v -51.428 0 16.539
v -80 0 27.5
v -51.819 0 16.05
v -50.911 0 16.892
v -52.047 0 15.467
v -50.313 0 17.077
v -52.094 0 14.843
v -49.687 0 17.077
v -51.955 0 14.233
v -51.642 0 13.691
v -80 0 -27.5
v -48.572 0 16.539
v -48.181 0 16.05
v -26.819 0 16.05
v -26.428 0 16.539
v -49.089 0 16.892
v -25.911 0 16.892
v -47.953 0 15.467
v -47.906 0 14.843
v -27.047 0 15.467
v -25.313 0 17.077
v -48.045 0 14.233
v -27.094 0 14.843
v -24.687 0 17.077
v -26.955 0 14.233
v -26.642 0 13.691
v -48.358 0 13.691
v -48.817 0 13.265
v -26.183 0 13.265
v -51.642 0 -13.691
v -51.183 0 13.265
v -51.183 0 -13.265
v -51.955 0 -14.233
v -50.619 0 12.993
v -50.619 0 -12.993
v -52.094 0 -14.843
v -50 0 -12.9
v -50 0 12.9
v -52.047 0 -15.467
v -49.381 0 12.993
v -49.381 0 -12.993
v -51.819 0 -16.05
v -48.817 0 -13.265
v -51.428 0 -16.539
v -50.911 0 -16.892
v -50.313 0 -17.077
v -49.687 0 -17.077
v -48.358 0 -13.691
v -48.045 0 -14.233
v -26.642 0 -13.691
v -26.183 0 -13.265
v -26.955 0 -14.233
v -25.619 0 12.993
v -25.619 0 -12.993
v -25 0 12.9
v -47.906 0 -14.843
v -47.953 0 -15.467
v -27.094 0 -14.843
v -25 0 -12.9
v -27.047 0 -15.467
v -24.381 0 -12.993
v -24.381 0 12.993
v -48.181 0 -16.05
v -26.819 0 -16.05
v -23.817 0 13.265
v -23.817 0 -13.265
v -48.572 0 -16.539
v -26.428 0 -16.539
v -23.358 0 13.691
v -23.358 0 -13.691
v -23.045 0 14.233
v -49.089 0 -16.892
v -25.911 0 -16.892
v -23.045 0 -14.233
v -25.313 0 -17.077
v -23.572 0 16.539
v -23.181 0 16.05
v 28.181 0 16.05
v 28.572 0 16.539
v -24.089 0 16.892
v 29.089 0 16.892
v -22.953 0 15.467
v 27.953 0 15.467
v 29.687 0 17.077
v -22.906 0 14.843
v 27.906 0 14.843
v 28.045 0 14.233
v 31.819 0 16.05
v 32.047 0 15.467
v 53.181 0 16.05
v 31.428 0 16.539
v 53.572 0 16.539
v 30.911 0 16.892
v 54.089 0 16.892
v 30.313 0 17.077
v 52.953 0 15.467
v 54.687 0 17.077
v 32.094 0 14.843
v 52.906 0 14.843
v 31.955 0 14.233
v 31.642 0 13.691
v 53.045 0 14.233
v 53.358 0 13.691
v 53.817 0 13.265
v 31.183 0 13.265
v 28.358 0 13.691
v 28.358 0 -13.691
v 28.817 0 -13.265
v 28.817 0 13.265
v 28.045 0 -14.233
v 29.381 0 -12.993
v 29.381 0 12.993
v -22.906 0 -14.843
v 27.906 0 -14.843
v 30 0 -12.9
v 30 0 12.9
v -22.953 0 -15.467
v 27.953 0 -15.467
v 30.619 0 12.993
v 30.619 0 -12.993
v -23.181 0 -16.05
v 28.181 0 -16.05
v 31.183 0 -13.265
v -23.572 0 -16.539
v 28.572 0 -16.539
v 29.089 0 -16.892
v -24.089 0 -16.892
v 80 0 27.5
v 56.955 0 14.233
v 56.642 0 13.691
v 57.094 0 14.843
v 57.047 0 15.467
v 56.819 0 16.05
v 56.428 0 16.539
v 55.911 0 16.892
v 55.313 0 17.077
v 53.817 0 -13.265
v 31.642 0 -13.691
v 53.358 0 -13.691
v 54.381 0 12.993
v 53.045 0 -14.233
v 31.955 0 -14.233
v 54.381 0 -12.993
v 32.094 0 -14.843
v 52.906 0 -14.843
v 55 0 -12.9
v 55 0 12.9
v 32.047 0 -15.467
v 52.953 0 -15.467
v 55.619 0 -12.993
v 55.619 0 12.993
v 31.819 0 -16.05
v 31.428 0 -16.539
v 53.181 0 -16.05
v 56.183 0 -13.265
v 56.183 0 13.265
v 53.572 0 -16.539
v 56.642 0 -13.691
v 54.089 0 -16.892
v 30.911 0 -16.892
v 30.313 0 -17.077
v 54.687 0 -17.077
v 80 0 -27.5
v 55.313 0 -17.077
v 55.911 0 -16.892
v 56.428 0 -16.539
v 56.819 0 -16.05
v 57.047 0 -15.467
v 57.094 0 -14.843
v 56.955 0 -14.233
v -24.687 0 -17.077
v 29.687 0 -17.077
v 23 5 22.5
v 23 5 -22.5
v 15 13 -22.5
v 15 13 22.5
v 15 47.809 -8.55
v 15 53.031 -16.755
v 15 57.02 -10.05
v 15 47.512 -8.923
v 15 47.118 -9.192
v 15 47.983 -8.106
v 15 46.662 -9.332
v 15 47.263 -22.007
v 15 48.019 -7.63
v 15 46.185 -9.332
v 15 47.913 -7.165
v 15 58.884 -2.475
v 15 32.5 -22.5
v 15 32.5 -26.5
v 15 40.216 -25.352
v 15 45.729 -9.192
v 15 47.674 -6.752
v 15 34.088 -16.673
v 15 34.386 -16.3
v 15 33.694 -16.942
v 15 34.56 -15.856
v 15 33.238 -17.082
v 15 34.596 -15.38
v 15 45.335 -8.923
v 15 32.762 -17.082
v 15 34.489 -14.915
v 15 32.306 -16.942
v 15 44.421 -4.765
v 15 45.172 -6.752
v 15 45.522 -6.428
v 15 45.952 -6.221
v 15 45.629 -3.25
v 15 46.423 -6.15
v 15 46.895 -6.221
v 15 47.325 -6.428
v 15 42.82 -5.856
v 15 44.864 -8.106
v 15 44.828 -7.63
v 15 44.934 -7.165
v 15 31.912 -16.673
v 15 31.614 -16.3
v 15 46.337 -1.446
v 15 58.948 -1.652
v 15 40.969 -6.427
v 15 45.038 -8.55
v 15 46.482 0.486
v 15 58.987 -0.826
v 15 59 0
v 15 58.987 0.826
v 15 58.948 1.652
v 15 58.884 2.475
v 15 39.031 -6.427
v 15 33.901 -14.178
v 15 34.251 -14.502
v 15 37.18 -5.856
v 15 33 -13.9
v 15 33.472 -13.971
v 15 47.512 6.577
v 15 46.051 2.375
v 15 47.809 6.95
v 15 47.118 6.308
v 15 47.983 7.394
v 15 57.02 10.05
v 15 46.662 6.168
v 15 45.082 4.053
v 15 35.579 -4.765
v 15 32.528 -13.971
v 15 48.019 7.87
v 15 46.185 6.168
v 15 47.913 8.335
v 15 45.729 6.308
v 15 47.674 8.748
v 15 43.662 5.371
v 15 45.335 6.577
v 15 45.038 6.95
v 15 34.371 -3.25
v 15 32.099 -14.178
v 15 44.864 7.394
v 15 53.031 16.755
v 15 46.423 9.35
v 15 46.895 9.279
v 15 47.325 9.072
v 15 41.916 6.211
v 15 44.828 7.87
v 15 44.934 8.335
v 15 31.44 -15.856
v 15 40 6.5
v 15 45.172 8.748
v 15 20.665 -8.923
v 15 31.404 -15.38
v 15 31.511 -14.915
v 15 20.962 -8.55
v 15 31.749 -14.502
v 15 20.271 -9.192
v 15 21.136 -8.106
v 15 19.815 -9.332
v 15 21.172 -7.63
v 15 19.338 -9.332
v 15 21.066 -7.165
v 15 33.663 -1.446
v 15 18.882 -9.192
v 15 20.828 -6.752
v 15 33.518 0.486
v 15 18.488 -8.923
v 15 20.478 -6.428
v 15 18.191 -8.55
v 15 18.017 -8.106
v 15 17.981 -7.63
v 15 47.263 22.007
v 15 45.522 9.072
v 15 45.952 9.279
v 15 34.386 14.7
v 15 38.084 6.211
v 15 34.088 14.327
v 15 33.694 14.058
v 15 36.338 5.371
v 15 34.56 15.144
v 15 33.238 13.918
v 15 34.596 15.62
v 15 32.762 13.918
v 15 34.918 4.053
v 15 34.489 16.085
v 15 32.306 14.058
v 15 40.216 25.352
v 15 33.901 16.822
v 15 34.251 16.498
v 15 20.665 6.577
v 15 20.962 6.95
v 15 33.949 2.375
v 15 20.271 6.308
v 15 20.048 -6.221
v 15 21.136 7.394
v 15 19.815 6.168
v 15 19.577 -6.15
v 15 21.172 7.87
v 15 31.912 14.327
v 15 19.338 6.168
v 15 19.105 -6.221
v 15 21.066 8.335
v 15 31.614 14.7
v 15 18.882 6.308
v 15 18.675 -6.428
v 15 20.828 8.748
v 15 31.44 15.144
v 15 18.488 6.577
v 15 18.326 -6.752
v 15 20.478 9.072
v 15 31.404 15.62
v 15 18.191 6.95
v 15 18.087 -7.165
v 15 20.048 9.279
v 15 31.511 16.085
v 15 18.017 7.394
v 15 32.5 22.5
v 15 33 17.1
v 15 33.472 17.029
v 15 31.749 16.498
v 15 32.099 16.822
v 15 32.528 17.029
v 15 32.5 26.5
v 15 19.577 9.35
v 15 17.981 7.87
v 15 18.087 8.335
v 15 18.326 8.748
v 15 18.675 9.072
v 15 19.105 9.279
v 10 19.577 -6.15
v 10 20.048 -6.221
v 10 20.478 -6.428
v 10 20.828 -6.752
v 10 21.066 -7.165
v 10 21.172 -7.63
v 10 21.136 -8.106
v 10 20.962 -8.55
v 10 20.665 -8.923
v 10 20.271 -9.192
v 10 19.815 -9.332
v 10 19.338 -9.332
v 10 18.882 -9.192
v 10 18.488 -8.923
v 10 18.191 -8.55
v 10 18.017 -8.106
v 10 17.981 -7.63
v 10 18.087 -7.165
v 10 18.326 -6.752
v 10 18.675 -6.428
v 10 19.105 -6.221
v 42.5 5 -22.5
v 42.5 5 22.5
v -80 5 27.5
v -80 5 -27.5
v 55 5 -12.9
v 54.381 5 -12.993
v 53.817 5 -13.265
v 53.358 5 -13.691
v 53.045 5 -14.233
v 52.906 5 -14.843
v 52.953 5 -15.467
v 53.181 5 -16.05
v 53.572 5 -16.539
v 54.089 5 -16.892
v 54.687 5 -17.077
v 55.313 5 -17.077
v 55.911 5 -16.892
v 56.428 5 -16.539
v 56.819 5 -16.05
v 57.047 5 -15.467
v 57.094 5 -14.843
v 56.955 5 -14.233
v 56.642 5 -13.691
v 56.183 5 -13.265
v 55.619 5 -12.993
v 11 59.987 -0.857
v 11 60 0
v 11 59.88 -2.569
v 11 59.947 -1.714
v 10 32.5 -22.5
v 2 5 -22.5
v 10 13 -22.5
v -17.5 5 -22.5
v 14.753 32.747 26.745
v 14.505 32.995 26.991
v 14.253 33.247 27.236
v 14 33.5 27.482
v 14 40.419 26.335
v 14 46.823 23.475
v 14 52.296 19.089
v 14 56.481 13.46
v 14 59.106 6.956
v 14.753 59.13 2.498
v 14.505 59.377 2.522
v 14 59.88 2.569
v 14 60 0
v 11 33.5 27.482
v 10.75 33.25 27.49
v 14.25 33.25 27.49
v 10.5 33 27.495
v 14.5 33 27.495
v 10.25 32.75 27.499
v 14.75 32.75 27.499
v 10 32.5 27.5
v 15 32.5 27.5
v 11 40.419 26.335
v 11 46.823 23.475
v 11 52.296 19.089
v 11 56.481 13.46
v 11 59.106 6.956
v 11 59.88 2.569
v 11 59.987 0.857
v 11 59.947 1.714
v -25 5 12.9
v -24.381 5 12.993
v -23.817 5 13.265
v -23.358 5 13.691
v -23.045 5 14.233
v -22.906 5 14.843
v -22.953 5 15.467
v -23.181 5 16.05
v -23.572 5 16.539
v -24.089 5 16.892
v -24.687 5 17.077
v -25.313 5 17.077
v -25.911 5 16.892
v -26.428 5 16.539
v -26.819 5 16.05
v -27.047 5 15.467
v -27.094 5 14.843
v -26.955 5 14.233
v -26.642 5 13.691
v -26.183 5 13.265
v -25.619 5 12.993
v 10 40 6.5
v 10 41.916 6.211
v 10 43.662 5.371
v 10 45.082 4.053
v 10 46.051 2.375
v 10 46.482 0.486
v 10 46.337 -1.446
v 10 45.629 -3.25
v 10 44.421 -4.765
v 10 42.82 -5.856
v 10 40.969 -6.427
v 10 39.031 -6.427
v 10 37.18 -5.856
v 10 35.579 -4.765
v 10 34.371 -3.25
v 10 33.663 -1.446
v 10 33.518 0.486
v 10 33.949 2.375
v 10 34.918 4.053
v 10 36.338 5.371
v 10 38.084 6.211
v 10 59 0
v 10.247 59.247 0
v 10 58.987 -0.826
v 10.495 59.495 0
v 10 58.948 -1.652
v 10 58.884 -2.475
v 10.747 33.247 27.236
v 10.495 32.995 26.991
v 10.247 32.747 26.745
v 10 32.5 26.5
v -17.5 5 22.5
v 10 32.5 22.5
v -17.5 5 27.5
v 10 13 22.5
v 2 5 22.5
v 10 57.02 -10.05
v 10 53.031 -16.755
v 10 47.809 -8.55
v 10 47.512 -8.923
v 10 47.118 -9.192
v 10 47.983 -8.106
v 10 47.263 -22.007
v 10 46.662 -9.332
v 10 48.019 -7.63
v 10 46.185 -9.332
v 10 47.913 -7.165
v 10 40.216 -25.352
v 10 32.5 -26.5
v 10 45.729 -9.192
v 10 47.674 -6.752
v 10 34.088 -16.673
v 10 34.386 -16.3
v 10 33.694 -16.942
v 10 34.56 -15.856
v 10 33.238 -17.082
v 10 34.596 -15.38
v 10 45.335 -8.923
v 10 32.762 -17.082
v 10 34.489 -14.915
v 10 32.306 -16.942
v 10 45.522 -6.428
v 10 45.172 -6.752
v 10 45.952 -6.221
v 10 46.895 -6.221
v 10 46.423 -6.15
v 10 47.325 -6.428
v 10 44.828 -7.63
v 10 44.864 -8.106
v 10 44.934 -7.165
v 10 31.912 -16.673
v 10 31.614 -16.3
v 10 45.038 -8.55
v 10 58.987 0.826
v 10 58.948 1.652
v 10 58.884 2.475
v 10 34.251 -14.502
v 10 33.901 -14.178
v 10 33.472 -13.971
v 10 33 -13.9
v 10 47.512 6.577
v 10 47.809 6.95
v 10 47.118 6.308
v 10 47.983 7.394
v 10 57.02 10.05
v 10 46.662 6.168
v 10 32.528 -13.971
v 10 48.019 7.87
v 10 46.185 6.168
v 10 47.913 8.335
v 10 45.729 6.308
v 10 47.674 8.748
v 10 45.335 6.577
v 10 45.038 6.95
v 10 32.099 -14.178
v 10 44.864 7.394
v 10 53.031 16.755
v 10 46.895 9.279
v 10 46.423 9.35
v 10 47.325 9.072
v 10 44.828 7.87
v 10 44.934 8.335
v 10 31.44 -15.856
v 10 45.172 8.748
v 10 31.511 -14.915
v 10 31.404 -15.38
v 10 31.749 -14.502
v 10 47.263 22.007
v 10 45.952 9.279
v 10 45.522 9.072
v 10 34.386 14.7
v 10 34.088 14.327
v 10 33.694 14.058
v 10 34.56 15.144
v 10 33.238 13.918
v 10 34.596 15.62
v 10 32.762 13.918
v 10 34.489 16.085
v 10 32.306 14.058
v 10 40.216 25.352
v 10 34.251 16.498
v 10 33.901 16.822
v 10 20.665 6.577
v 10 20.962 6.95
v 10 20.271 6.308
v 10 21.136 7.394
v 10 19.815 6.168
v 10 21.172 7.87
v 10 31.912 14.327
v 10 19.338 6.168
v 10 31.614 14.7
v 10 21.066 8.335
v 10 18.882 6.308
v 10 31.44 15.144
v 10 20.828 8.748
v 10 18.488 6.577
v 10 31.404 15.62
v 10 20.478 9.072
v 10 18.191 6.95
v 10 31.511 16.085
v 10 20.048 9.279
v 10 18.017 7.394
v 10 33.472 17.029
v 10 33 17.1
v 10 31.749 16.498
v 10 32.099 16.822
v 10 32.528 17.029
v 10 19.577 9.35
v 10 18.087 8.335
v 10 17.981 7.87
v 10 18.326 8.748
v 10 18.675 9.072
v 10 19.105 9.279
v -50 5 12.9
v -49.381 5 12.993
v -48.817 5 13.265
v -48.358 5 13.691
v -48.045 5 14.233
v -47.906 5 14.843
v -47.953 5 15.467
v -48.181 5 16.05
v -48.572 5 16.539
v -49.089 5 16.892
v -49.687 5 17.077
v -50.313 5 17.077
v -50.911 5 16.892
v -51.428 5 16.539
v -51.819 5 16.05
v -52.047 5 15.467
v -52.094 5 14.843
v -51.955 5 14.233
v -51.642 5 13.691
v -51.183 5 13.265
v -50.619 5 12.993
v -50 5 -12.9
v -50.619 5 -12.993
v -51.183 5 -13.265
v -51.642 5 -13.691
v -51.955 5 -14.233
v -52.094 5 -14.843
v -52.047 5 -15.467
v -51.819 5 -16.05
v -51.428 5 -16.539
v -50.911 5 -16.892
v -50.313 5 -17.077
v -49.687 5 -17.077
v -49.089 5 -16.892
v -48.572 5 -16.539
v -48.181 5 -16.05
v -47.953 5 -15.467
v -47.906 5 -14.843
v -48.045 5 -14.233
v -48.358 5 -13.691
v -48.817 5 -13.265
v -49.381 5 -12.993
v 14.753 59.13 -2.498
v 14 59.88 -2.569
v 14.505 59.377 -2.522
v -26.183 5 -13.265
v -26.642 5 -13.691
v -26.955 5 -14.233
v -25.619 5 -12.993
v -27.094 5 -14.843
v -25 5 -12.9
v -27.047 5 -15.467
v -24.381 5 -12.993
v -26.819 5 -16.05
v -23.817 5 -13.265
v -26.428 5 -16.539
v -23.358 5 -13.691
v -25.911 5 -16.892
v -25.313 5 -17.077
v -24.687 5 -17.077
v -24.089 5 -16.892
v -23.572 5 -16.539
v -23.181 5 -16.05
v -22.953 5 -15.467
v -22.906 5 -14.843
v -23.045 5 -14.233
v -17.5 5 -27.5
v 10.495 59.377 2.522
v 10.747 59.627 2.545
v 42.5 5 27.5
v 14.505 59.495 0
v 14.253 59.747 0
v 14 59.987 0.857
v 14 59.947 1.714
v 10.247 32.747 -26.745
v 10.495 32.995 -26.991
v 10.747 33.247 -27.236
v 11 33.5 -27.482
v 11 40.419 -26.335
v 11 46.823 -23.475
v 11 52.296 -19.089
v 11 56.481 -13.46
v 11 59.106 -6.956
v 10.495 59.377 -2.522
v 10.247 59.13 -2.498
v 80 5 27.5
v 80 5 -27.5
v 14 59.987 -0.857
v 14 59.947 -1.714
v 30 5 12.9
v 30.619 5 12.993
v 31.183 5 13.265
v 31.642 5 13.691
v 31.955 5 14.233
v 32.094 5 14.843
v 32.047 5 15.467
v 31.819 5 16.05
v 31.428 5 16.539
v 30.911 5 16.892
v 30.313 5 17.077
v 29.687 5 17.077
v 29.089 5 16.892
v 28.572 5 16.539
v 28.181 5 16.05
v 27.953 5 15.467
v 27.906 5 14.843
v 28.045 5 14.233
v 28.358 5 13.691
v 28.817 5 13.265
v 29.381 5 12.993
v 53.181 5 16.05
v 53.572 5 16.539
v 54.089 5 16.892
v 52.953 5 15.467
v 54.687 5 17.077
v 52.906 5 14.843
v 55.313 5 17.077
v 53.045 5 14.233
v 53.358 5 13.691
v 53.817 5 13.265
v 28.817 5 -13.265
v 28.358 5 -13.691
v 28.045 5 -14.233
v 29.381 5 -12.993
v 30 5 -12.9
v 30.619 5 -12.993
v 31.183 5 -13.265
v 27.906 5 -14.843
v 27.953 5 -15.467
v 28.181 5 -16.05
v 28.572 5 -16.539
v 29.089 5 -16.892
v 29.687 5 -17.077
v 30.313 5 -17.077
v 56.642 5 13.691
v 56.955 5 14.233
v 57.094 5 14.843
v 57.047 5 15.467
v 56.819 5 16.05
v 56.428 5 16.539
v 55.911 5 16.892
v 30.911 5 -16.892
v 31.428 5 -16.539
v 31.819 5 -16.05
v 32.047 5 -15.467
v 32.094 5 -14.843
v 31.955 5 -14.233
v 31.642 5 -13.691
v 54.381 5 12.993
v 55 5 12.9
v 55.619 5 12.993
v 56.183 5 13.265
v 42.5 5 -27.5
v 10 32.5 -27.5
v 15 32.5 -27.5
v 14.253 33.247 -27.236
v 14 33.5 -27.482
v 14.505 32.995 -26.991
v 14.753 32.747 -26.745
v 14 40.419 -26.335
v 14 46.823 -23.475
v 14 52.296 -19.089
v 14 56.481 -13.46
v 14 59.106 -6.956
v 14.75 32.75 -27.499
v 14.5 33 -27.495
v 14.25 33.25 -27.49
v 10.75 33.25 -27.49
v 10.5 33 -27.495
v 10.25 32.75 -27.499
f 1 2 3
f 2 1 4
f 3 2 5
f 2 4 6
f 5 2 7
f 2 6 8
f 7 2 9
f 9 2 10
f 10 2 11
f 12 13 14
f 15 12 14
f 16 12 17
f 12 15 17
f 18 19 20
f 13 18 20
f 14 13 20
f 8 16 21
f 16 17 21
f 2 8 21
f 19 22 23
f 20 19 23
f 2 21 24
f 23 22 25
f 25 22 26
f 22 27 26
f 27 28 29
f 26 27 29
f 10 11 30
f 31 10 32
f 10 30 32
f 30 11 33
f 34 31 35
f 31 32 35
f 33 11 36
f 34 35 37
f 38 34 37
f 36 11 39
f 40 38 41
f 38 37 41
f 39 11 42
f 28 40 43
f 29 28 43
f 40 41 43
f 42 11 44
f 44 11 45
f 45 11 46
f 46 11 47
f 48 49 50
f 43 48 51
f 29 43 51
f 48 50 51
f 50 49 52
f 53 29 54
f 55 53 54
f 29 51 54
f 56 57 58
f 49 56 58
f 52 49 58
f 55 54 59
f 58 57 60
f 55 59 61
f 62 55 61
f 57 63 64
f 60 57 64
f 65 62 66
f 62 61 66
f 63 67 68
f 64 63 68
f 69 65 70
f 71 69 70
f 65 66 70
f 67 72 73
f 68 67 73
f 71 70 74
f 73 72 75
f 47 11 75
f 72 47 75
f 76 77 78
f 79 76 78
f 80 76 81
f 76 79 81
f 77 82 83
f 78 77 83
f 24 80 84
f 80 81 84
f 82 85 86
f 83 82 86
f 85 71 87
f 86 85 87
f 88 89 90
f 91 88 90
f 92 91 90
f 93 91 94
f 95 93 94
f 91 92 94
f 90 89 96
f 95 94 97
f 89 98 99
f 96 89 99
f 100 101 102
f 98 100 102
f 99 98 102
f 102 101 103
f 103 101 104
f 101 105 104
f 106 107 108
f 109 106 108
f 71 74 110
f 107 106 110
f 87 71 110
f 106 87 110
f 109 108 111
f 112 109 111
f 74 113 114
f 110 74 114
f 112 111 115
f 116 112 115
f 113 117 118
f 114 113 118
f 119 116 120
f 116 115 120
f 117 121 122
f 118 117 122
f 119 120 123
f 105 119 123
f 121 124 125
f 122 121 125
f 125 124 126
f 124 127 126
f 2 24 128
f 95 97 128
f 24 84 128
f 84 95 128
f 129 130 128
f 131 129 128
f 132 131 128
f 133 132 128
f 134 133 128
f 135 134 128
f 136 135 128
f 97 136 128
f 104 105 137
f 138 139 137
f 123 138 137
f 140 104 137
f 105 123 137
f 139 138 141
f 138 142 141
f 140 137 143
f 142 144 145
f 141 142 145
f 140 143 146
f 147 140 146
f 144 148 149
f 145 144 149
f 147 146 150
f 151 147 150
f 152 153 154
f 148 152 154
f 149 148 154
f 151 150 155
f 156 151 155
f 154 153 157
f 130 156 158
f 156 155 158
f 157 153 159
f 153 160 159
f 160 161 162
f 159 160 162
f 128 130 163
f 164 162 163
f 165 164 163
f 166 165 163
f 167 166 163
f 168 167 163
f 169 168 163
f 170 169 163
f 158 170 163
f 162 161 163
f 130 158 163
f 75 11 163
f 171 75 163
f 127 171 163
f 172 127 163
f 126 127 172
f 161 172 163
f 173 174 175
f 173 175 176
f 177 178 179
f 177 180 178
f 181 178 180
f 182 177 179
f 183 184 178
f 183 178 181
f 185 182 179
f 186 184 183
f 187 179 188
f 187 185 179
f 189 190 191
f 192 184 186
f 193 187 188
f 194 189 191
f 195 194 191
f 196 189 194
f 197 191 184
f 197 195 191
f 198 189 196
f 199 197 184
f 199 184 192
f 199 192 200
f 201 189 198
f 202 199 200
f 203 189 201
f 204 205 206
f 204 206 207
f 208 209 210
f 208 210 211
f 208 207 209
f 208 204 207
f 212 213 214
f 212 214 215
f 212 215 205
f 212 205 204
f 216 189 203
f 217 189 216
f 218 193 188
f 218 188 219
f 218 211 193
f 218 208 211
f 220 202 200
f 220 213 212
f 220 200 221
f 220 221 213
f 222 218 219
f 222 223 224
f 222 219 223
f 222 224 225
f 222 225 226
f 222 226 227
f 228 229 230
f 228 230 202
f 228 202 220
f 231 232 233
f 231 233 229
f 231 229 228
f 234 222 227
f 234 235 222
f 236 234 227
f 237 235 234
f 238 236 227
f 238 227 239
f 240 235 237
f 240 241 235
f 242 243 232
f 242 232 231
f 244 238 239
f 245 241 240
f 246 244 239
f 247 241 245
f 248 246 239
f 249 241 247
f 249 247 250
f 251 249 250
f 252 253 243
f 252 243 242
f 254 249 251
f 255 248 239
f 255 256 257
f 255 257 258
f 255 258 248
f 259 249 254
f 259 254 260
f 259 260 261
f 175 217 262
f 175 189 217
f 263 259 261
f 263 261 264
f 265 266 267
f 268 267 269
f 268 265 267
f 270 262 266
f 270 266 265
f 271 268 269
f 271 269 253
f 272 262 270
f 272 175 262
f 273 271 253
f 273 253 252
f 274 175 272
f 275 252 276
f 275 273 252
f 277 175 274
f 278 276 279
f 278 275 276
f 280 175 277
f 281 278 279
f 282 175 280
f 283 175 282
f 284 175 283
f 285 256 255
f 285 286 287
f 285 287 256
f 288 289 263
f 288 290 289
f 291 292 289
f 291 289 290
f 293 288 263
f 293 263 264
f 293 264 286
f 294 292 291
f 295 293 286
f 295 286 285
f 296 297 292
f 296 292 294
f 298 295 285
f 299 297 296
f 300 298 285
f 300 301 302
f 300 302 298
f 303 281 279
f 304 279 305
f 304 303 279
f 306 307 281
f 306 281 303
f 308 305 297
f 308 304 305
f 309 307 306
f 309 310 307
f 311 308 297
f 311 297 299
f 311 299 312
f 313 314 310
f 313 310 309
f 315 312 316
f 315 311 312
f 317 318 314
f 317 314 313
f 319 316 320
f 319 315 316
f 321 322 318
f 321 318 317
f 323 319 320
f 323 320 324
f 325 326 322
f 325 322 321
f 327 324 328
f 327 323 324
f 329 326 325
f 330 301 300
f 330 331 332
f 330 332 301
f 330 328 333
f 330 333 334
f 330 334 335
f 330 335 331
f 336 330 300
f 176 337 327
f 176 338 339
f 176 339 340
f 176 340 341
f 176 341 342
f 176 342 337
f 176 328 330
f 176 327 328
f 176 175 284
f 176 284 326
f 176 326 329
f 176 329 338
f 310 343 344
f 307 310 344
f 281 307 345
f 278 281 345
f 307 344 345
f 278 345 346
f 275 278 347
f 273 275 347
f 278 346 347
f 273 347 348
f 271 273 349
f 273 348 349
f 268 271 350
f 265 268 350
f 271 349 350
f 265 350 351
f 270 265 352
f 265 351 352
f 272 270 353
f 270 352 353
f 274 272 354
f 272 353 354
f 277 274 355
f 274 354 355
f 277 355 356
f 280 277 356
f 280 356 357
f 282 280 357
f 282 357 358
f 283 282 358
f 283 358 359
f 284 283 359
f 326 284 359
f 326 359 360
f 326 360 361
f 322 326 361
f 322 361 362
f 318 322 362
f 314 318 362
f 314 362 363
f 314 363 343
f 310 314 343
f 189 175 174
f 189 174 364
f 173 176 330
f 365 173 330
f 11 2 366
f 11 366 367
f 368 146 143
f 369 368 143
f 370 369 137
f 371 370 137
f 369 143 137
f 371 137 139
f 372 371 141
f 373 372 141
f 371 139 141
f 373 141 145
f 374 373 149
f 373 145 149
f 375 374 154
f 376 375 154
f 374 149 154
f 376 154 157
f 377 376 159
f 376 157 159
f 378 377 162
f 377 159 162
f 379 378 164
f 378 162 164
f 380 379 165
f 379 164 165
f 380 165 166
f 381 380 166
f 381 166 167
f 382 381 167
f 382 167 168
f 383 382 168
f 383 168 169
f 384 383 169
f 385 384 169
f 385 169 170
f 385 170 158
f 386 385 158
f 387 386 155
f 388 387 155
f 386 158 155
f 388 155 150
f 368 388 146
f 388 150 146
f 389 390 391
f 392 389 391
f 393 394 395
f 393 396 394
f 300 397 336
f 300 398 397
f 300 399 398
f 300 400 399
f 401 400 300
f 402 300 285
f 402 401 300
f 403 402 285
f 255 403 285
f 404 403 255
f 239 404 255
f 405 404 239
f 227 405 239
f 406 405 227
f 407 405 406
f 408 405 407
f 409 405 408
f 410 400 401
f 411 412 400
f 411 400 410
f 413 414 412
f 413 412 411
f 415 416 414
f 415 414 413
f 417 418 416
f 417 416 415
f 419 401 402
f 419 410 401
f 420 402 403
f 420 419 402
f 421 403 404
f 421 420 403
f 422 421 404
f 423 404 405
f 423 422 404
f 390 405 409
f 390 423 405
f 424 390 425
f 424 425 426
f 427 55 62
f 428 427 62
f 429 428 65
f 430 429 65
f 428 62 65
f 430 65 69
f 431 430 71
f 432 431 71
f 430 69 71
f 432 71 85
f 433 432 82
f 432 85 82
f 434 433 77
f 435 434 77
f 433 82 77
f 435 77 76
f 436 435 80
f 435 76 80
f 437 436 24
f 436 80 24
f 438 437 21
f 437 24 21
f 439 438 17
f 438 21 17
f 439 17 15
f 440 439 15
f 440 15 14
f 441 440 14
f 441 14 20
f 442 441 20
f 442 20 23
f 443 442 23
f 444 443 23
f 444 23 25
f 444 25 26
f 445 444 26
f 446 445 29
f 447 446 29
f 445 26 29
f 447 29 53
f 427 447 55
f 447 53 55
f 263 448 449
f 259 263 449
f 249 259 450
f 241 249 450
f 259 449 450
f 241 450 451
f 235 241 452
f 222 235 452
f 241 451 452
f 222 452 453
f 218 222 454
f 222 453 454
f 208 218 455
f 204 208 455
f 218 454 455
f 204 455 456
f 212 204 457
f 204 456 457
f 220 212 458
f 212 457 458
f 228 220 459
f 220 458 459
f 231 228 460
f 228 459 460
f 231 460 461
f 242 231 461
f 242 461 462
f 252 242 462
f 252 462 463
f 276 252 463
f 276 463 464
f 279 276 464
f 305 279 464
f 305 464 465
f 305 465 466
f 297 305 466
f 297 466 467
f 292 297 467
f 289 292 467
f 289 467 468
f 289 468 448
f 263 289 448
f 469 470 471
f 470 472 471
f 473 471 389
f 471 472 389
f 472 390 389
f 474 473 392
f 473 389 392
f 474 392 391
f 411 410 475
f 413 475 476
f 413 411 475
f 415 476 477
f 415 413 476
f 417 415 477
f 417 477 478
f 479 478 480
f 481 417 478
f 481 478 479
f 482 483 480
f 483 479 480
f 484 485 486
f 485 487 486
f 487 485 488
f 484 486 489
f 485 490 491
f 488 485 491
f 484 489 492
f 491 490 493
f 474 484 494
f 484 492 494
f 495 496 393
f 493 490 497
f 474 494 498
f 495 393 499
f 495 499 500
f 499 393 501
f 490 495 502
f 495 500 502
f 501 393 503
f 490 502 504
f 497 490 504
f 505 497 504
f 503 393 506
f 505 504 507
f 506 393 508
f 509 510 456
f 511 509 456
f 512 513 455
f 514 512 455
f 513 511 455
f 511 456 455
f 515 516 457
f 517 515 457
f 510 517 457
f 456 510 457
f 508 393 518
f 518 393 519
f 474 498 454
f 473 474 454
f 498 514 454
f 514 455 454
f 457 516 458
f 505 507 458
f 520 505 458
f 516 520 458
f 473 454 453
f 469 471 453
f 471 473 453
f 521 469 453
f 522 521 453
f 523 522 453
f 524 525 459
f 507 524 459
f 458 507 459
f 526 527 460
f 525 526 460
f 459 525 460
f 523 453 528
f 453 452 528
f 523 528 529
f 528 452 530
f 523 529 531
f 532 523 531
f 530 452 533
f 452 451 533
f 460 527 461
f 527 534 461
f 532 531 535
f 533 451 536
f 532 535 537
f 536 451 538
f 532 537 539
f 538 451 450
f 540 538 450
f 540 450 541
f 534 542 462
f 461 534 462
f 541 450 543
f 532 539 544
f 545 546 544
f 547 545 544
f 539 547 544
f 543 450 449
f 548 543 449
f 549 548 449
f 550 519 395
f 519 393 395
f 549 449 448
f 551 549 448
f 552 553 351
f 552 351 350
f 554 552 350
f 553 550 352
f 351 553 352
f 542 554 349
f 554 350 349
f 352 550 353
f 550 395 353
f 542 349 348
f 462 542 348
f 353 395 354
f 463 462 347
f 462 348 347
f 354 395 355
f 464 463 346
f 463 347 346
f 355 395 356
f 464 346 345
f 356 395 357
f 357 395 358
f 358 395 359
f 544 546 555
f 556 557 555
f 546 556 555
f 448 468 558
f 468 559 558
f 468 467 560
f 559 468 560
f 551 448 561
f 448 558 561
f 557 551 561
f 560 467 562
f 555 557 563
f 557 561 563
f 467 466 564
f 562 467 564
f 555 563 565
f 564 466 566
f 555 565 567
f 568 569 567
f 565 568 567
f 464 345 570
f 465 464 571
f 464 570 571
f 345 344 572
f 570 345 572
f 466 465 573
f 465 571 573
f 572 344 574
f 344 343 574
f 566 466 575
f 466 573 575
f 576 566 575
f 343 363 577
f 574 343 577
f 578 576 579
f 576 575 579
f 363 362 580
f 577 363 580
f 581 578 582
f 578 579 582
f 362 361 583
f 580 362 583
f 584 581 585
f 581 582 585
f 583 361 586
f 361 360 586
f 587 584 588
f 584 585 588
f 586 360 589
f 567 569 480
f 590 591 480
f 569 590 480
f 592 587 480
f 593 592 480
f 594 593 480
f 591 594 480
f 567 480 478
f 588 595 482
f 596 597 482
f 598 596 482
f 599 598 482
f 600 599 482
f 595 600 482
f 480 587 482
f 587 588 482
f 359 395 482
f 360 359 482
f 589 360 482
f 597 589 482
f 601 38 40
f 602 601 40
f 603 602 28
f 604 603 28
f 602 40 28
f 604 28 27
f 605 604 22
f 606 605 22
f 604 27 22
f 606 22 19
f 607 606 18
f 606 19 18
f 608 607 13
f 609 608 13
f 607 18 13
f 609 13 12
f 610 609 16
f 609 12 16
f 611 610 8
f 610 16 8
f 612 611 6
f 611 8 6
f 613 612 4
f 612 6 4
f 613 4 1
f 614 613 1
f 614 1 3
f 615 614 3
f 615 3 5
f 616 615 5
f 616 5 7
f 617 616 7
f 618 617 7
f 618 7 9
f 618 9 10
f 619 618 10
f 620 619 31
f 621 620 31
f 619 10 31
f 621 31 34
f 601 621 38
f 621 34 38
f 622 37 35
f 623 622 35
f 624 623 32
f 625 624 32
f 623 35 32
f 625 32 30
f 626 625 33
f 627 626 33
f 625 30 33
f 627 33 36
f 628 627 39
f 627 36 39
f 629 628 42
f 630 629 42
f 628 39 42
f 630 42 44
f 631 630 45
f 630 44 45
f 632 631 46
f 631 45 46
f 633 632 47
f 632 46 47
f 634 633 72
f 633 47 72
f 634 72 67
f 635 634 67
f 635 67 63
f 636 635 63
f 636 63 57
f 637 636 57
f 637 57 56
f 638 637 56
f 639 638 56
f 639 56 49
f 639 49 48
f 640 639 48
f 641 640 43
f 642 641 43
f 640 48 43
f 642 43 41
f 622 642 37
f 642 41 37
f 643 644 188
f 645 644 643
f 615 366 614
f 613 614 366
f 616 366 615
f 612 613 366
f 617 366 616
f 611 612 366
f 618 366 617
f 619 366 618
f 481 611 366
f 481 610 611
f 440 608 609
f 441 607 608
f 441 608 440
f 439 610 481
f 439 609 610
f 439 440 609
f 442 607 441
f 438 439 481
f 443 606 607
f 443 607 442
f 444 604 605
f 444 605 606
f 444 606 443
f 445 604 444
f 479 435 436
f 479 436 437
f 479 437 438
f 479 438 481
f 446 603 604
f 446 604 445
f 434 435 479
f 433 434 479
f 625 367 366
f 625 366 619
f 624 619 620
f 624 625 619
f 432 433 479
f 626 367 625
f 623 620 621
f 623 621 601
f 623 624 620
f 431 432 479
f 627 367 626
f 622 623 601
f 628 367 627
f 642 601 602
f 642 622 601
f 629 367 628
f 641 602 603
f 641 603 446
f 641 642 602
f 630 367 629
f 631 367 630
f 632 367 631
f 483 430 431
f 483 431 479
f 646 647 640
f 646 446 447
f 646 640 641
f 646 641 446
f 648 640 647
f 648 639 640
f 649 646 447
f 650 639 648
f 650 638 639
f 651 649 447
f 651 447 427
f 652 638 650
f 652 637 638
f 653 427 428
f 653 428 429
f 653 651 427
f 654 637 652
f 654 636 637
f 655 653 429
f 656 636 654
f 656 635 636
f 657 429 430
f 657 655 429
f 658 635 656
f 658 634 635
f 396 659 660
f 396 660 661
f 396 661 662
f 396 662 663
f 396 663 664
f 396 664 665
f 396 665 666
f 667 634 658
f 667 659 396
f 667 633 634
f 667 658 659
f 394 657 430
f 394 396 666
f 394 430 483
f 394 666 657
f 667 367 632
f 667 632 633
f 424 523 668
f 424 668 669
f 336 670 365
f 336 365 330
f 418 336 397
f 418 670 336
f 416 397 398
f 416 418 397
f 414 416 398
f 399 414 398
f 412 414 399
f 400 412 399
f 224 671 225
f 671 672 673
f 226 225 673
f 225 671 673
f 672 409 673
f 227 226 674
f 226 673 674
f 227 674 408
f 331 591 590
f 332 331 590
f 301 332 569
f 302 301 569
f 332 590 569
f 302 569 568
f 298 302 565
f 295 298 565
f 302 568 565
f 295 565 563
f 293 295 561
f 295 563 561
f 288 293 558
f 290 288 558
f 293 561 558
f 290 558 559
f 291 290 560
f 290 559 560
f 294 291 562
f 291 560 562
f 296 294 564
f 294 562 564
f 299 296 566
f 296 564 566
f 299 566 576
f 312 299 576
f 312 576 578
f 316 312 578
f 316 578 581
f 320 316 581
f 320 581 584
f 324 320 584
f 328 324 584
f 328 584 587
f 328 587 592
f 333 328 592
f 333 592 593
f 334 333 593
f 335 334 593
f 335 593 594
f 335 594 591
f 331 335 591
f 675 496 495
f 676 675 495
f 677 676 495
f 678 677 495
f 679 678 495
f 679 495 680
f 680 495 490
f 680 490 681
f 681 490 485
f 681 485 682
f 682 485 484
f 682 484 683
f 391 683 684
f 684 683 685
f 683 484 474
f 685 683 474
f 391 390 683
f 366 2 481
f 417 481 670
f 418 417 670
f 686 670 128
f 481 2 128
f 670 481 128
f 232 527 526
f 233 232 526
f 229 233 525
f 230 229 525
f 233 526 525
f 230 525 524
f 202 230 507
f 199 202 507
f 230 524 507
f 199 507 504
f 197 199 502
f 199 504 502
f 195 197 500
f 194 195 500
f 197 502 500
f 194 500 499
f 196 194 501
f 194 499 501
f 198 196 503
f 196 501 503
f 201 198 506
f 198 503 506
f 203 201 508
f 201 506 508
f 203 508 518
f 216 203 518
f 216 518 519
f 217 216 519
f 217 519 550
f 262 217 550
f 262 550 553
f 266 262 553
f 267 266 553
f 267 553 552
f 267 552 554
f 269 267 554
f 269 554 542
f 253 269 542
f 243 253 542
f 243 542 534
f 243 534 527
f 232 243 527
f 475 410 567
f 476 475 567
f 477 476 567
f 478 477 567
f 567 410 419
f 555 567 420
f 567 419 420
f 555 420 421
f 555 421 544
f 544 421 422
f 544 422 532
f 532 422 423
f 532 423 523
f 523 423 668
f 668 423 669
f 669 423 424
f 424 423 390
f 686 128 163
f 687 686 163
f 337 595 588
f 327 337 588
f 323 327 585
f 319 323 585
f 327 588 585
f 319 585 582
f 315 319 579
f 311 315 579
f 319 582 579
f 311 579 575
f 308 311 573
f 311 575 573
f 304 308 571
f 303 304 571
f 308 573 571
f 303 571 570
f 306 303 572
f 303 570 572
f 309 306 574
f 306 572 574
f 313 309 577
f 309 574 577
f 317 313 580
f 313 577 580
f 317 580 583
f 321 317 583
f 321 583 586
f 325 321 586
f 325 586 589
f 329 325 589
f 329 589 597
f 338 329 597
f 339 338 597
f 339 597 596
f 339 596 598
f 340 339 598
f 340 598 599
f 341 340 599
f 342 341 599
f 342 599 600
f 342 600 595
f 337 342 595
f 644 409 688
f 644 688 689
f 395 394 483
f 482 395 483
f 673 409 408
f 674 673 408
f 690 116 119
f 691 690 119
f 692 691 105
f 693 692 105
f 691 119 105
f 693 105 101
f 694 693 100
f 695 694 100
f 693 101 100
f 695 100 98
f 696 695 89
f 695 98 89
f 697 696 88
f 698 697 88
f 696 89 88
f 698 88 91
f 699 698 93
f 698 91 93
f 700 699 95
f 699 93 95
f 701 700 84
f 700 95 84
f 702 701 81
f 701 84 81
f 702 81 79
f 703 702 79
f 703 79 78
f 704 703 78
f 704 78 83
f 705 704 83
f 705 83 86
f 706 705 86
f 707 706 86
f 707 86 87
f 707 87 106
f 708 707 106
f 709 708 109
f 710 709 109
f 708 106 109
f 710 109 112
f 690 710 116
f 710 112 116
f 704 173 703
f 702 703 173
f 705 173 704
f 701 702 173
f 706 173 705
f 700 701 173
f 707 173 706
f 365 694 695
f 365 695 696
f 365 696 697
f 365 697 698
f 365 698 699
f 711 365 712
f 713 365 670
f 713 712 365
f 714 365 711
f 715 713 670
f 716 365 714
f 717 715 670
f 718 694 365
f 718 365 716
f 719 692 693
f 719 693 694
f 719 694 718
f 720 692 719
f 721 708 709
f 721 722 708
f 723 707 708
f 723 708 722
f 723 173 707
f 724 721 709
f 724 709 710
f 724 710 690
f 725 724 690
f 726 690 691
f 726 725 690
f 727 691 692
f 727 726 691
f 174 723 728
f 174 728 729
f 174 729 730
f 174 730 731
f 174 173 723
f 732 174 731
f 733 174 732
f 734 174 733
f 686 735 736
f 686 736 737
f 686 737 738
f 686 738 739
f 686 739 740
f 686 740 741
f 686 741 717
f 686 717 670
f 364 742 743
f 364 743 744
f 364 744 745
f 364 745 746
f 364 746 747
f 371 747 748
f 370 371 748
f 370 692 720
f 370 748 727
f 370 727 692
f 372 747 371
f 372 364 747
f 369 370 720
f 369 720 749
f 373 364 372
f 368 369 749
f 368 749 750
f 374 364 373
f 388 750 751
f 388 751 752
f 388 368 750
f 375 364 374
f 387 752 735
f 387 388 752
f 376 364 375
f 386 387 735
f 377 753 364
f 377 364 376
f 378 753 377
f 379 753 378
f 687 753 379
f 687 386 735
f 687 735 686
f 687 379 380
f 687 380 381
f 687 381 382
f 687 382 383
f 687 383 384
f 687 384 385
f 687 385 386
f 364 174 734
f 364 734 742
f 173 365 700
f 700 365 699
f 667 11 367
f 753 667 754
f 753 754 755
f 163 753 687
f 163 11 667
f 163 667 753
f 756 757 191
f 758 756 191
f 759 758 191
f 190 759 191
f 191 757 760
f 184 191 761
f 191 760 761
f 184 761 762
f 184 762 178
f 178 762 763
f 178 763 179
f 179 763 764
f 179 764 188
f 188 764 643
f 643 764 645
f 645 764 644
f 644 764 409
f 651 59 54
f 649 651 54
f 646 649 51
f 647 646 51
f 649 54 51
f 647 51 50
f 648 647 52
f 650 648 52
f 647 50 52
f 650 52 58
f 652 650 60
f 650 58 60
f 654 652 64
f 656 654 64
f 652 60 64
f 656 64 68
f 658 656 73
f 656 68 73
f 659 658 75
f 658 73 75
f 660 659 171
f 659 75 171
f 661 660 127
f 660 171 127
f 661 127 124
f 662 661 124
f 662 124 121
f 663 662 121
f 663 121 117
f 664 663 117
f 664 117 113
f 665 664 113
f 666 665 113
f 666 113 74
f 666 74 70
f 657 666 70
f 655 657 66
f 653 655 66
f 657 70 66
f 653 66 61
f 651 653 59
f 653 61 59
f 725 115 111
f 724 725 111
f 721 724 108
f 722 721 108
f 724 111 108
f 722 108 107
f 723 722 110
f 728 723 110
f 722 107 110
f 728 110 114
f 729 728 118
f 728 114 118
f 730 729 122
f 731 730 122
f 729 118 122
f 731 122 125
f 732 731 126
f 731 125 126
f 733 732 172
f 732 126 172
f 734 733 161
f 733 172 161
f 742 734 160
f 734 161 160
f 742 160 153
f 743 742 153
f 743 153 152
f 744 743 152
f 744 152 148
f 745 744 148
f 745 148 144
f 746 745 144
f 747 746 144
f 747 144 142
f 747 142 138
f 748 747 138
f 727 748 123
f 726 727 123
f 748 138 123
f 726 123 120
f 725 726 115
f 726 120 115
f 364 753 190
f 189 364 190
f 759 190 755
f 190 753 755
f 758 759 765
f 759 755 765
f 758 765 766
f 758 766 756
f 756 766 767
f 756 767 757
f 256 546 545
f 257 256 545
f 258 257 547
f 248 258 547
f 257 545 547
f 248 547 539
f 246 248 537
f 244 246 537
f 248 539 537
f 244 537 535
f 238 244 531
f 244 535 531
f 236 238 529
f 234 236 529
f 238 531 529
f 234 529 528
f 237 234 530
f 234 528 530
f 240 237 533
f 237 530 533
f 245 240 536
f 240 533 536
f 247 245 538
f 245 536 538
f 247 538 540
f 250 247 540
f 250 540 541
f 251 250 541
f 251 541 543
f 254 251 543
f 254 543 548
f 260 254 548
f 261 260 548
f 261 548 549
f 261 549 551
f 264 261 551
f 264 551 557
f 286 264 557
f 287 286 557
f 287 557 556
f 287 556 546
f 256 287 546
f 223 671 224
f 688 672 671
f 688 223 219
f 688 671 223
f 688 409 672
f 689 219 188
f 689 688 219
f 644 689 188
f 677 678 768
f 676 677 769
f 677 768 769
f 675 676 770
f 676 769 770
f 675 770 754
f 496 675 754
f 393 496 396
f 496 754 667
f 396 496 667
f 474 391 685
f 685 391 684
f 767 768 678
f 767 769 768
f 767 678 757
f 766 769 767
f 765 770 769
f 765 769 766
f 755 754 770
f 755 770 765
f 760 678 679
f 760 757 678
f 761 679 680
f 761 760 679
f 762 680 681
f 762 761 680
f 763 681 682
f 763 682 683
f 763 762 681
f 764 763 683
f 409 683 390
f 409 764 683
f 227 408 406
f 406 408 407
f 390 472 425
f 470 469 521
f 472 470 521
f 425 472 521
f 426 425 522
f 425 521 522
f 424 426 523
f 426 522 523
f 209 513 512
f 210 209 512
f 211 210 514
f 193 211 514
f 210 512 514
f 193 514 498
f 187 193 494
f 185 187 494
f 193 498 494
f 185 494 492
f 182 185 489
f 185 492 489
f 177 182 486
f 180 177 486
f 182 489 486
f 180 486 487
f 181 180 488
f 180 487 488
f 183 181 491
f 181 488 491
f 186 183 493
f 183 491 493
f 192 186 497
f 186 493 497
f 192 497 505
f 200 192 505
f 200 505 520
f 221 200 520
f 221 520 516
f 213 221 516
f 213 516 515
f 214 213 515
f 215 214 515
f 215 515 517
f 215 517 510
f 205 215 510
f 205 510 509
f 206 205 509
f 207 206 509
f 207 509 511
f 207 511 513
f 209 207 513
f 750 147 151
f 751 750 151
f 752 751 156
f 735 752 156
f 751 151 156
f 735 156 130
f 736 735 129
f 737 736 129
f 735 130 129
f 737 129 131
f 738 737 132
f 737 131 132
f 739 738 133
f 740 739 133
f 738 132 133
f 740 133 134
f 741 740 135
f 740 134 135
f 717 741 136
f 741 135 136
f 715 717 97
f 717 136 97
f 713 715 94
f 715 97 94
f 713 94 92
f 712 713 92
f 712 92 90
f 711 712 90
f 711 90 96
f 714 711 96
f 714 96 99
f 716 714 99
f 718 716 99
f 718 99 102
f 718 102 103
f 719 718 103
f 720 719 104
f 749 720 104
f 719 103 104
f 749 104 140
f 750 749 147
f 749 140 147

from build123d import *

# Parameters (mm, degrees)
SKETCH_1_W          = 160
SKETCH_1_H          = 55
EXTRUDE_1_DEPTH     = 5
EXTRUDE_2_DEPTH     = 55
FILLET_1_R          = 27.5
CUT_EXTRUDE_1_REACH = 113.608
SKETCH_3_R          = 6.5
SKETCH_4_R          = 1.6
CUT_EXTRUDE_2_DEPTH = 10
CHAMFER_1_SIZE      = 8
CHAMFER_2_SIZE      = 8
EXTRUDE_5_DEPTH     = 5
CHAMFER_3_SIZE      = 1
SKETCH_7_R          = 2.1
CUT_EXTRUDE_3_DEPTH = 5


# Some blends are built 0.0001 mm under size
with BuildPart() as part:
    # 草图1 → 凸台-拉伸1 (new body)
    with BuildSketch(Plane(origin=(0, 0, 0), x_dir=(1, 0, 0), z_dir=(0, 1, 0))):
        Rectangle(SKETCH_1_W, SKETCH_1_H)
    extrude(amount=EXTRUDE_1_DEPTH)

    # 草图2 → 凸台-拉伸2 (add)
    with BuildSketch(Plane(origin=(0, 5, 0), x_dir=(1, 0, 0), z_dir=(0, 1, 0))):
        Polygon((10, 0), (10, 27.5), (15, 27.5), (15, -27.5), (10, -27.5), align=None)
    extrude(amount=EXTRUDE_2_DEPTH)

    # 圆角1
    fillet_1_edges = [part.edges().sort_by_distance(p)[0] for p in [
        (12.5, 60, -27.5),
        (12.5, 60, 27.5),
    ]]
    fillet(fillet_1_edges, radius=FILLET_1_R - 0.0001)  # a hair under: the kernel refuses the full size

    # 草图3 → 切除-拉伸1 (cut, up to next)
    with BuildSketch(Plane.ZY.offset(-10), mode=Mode.PRIVATE) as cut_extrude_1_sk1:
        with Locations((0, 40)):
            Circle(SKETCH_3_R)
    cut_extrude_1_tool1 = extrude(cut_extrude_1_sk1.sketch, amount=-CUT_EXTRUDE_1_REACH, mode=Mode.PRIVATE) & part.part
    add(cut_extrude_1_tool1.solids().sort_by_distance((10, 40, 0))[0], mode=Mode.SUBTRACT)

    # 草图4 → 切除-拉伸2 (cut)
    with BuildSketch(Plane.ZY.offset(-10)):
        with Locations((15.5, 33)):
            Circle(SKETCH_4_R)
        with Locations((7.75, 19.576606241)):
            Circle(SKETCH_4_R)
        with Locations((-7.75, 19.576606241)):
            Circle(SKETCH_4_R)
        with Locations((-15.5, 33)):
            Circle(SKETCH_4_R)
        with Locations((-7.75, 46.423393759)):
            Circle(SKETCH_4_R)
        with Locations((7.75, 46.423393759)):
            Circle(SKETCH_4_R)
    extrude(amount=-CUT_EXTRUDE_2_DEPTH, mode=Mode.SUBTRACT)

    # 倒角1
    chamfer_1_edges = [part.edges().sort_by_distance(p)[0] for p in [
        (10, 5, 0),
    ]]
    chamfer(chamfer_1_edges, length=CHAMFER_1_SIZE)

    # 倒角2
    chamfer_2_edges = [part.edges().sort_by_distance(p)[0] for p in [
        (15, 5, 0),
    ]]
    chamfer(chamfer_2_edges, length=CHAMFER_2_SIZE)

    # 草图6 → 凸台-拉伸5 (add)
    with BuildSketch(Plane.XY.offset(27.5)):
        Polygon((10, 5), (10, 32.5), (-17.5, 5), align=None)
        Polygon((15, 32.5), (15, 5), (42.5, 5), align=None)
    extrude_5 = extrude(amount=-EXTRUDE_5_DEPTH)

    # 镜向1: 凸台-拉伸5 across plane
    add(extrude_5.mirror(Plane.XY))

    # 倒角3
    # the kernel refuses this chamfer: 1 mm, written as the material it takes off along each edge
    with BuildSketch(Plane(origin=(10, 32.5001, 0.0001), x_dir=(0, -0.09341724291060717, 0.9956270480089322), z_dir=(0, -0.9956270480089322, -0.09341724291060717))) as chamfer_3_piece_1_section:
        Polygon((27.4999 - CHAMFER_3_SIZE, 0), (27.4999, -CHAMFER_3_SIZE), (27.4999, 0), align=None)
    chamfer_3_piece_1 = revolve(axis=Axis((10, 32.5001, 0.0001), (-1, 0, 0)), revolution_arc=100.720458749, mode=Mode.PRIVATE)
    chamfer_3_piece_1 = split(chamfer_3_piece_1, bisect_by=Plane(origin=(20.22926311, 42.72926311, 18.191765192), z_dir=(-0.7071067811865475, 0.7071067811865477, 0)), keep=Keep.TOP, mode=Mode.PRIVATE)
    add(chamfer_3_piece_1, mode=Mode.SUBTRACT)
    with BuildSketch(Plane(origin=(10, 32.5001, -0.0001), x_dir=(0, -0.09341724291060717, -0.9956270480089322), z_dir=(0, -0.9956270480089322, 0.09341724291060717))) as chamfer_3_piece_2_section:
        Polygon((27.4999, CHAMFER_3_SIZE), (27.4999 - CHAMFER_3_SIZE, 0), (27.4999, 0), align=None)
    chamfer_3_piece_2 = revolve(axis=Axis((10, 32.5001, -0.0001), (1, 0, 0)), revolution_arc=100.720458749, mode=Mode.PRIVATE)
    chamfer_3_piece_2 = split(chamfer_3_piece_2, bisect_by=Plane(origin=(20.397792602, 42.897792602, -19.088683077), z_dir=(-0.7071067811865475, 0.7071067811865477, 0)), keep=Keep.TOP, mode=Mode.PRIVATE)
    add(chamfer_3_piece_2, mode=Mode.SUBTRACT)
    with BuildSketch(Plane(origin=(15, 32.5001, 0.0001), x_dir=(0, -0.09341724291060717, 0.9956270480089322), z_dir=(0, -0.9956270480089322, -0.09341724291060717))) as chamfer_3_piece_3_section:
        Polygon((27.4999 - CHAMFER_3_SIZE, 0), (27.4999, CHAMFER_3_SIZE), (27.4999, 0), align=None)
    chamfer_3_piece_3 = revolve(axis=Axis((15, 32.5001, 0.0001), (-1, 0, 0)), revolution_arc=100.720458749, mode=Mode.PRIVATE)
    chamfer_3_piece_3 = split(chamfer_3_piece_3, bisect_by=Plane(origin=(4.77073689, 42.72926311, 18.191765192), z_dir=(0.7071067811865476, 0.7071067811865476, 0)), keep=Keep.TOP, mode=Mode.PRIVATE)
    add(chamfer_3_piece_3, mode=Mode.SUBTRACT)
    with BuildSketch(Plane(origin=(15, 32.5001, -0.0001), x_dir=(0, -0.09341724291060717, -0.9956270480089322), z_dir=(0, -0.9956270480089322, 0.09341724291060717))) as chamfer_3_piece_4_section:
        Polygon((27.4999 - CHAMFER_3_SIZE, 0), (27.4999, -CHAMFER_3_SIZE), (27.4999, 0), align=None)
    chamfer_3_piece_4 = revolve(axis=Axis((15, 32.5001, -0.0001), (1, 0, 0)), revolution_arc=100.720458749, mode=Mode.PRIVATE)
    chamfer_3_piece_4 = split(chamfer_3_piece_4, bisect_by=Plane(origin=(4.77073689, 42.72926311, -18.191765192), z_dir=(0.7071067811865476, 0.7071067811865476, 0)), keep=Keep.TOP, mode=Mode.PRIVATE)
    add(chamfer_3_piece_4, mode=Mode.SUBTRACT)

    # 草图7 → 切除-拉伸3 (cut)
    with BuildSketch(Plane(origin=(0, 0, 0), x_dir=(-1, 0, 0), z_dir=(0, -1, 0))):
        with Locations(Location((50, -15, 0), (0, 0, 90))):
            Circle(SKETCH_7_R)
        with Locations(Location((25, -15, 0), (0, 0, 90))):
            Circle(SKETCH_7_R)
        with Locations(Location((-30, -15, 0), (0, 0, 90))):
            Circle(SKETCH_7_R)
        with Locations(Location((-55, -15, 0), (0, 0, 90))):
            Circle(SKETCH_7_R)
        with Locations(Location((-55, 15, 0), (0, 0, 270))):
            Circle(SKETCH_7_R)
        with Locations(Location((-30, 15, 0), (0, 0, 270))):
            Circle(SKETCH_7_R)
        with Locations(Location((25, 15, 0), (0, 0, 270))):
            Circle(SKETCH_7_R)
        with Locations(Location((50, 15, 0), (0, 0, 270))):
            Circle(SKETCH_7_R)
    extrude(amount=-CUT_EXTRUDE_3_DEPTH, mode=Mode.SUBTRACT)


solid = part.part
